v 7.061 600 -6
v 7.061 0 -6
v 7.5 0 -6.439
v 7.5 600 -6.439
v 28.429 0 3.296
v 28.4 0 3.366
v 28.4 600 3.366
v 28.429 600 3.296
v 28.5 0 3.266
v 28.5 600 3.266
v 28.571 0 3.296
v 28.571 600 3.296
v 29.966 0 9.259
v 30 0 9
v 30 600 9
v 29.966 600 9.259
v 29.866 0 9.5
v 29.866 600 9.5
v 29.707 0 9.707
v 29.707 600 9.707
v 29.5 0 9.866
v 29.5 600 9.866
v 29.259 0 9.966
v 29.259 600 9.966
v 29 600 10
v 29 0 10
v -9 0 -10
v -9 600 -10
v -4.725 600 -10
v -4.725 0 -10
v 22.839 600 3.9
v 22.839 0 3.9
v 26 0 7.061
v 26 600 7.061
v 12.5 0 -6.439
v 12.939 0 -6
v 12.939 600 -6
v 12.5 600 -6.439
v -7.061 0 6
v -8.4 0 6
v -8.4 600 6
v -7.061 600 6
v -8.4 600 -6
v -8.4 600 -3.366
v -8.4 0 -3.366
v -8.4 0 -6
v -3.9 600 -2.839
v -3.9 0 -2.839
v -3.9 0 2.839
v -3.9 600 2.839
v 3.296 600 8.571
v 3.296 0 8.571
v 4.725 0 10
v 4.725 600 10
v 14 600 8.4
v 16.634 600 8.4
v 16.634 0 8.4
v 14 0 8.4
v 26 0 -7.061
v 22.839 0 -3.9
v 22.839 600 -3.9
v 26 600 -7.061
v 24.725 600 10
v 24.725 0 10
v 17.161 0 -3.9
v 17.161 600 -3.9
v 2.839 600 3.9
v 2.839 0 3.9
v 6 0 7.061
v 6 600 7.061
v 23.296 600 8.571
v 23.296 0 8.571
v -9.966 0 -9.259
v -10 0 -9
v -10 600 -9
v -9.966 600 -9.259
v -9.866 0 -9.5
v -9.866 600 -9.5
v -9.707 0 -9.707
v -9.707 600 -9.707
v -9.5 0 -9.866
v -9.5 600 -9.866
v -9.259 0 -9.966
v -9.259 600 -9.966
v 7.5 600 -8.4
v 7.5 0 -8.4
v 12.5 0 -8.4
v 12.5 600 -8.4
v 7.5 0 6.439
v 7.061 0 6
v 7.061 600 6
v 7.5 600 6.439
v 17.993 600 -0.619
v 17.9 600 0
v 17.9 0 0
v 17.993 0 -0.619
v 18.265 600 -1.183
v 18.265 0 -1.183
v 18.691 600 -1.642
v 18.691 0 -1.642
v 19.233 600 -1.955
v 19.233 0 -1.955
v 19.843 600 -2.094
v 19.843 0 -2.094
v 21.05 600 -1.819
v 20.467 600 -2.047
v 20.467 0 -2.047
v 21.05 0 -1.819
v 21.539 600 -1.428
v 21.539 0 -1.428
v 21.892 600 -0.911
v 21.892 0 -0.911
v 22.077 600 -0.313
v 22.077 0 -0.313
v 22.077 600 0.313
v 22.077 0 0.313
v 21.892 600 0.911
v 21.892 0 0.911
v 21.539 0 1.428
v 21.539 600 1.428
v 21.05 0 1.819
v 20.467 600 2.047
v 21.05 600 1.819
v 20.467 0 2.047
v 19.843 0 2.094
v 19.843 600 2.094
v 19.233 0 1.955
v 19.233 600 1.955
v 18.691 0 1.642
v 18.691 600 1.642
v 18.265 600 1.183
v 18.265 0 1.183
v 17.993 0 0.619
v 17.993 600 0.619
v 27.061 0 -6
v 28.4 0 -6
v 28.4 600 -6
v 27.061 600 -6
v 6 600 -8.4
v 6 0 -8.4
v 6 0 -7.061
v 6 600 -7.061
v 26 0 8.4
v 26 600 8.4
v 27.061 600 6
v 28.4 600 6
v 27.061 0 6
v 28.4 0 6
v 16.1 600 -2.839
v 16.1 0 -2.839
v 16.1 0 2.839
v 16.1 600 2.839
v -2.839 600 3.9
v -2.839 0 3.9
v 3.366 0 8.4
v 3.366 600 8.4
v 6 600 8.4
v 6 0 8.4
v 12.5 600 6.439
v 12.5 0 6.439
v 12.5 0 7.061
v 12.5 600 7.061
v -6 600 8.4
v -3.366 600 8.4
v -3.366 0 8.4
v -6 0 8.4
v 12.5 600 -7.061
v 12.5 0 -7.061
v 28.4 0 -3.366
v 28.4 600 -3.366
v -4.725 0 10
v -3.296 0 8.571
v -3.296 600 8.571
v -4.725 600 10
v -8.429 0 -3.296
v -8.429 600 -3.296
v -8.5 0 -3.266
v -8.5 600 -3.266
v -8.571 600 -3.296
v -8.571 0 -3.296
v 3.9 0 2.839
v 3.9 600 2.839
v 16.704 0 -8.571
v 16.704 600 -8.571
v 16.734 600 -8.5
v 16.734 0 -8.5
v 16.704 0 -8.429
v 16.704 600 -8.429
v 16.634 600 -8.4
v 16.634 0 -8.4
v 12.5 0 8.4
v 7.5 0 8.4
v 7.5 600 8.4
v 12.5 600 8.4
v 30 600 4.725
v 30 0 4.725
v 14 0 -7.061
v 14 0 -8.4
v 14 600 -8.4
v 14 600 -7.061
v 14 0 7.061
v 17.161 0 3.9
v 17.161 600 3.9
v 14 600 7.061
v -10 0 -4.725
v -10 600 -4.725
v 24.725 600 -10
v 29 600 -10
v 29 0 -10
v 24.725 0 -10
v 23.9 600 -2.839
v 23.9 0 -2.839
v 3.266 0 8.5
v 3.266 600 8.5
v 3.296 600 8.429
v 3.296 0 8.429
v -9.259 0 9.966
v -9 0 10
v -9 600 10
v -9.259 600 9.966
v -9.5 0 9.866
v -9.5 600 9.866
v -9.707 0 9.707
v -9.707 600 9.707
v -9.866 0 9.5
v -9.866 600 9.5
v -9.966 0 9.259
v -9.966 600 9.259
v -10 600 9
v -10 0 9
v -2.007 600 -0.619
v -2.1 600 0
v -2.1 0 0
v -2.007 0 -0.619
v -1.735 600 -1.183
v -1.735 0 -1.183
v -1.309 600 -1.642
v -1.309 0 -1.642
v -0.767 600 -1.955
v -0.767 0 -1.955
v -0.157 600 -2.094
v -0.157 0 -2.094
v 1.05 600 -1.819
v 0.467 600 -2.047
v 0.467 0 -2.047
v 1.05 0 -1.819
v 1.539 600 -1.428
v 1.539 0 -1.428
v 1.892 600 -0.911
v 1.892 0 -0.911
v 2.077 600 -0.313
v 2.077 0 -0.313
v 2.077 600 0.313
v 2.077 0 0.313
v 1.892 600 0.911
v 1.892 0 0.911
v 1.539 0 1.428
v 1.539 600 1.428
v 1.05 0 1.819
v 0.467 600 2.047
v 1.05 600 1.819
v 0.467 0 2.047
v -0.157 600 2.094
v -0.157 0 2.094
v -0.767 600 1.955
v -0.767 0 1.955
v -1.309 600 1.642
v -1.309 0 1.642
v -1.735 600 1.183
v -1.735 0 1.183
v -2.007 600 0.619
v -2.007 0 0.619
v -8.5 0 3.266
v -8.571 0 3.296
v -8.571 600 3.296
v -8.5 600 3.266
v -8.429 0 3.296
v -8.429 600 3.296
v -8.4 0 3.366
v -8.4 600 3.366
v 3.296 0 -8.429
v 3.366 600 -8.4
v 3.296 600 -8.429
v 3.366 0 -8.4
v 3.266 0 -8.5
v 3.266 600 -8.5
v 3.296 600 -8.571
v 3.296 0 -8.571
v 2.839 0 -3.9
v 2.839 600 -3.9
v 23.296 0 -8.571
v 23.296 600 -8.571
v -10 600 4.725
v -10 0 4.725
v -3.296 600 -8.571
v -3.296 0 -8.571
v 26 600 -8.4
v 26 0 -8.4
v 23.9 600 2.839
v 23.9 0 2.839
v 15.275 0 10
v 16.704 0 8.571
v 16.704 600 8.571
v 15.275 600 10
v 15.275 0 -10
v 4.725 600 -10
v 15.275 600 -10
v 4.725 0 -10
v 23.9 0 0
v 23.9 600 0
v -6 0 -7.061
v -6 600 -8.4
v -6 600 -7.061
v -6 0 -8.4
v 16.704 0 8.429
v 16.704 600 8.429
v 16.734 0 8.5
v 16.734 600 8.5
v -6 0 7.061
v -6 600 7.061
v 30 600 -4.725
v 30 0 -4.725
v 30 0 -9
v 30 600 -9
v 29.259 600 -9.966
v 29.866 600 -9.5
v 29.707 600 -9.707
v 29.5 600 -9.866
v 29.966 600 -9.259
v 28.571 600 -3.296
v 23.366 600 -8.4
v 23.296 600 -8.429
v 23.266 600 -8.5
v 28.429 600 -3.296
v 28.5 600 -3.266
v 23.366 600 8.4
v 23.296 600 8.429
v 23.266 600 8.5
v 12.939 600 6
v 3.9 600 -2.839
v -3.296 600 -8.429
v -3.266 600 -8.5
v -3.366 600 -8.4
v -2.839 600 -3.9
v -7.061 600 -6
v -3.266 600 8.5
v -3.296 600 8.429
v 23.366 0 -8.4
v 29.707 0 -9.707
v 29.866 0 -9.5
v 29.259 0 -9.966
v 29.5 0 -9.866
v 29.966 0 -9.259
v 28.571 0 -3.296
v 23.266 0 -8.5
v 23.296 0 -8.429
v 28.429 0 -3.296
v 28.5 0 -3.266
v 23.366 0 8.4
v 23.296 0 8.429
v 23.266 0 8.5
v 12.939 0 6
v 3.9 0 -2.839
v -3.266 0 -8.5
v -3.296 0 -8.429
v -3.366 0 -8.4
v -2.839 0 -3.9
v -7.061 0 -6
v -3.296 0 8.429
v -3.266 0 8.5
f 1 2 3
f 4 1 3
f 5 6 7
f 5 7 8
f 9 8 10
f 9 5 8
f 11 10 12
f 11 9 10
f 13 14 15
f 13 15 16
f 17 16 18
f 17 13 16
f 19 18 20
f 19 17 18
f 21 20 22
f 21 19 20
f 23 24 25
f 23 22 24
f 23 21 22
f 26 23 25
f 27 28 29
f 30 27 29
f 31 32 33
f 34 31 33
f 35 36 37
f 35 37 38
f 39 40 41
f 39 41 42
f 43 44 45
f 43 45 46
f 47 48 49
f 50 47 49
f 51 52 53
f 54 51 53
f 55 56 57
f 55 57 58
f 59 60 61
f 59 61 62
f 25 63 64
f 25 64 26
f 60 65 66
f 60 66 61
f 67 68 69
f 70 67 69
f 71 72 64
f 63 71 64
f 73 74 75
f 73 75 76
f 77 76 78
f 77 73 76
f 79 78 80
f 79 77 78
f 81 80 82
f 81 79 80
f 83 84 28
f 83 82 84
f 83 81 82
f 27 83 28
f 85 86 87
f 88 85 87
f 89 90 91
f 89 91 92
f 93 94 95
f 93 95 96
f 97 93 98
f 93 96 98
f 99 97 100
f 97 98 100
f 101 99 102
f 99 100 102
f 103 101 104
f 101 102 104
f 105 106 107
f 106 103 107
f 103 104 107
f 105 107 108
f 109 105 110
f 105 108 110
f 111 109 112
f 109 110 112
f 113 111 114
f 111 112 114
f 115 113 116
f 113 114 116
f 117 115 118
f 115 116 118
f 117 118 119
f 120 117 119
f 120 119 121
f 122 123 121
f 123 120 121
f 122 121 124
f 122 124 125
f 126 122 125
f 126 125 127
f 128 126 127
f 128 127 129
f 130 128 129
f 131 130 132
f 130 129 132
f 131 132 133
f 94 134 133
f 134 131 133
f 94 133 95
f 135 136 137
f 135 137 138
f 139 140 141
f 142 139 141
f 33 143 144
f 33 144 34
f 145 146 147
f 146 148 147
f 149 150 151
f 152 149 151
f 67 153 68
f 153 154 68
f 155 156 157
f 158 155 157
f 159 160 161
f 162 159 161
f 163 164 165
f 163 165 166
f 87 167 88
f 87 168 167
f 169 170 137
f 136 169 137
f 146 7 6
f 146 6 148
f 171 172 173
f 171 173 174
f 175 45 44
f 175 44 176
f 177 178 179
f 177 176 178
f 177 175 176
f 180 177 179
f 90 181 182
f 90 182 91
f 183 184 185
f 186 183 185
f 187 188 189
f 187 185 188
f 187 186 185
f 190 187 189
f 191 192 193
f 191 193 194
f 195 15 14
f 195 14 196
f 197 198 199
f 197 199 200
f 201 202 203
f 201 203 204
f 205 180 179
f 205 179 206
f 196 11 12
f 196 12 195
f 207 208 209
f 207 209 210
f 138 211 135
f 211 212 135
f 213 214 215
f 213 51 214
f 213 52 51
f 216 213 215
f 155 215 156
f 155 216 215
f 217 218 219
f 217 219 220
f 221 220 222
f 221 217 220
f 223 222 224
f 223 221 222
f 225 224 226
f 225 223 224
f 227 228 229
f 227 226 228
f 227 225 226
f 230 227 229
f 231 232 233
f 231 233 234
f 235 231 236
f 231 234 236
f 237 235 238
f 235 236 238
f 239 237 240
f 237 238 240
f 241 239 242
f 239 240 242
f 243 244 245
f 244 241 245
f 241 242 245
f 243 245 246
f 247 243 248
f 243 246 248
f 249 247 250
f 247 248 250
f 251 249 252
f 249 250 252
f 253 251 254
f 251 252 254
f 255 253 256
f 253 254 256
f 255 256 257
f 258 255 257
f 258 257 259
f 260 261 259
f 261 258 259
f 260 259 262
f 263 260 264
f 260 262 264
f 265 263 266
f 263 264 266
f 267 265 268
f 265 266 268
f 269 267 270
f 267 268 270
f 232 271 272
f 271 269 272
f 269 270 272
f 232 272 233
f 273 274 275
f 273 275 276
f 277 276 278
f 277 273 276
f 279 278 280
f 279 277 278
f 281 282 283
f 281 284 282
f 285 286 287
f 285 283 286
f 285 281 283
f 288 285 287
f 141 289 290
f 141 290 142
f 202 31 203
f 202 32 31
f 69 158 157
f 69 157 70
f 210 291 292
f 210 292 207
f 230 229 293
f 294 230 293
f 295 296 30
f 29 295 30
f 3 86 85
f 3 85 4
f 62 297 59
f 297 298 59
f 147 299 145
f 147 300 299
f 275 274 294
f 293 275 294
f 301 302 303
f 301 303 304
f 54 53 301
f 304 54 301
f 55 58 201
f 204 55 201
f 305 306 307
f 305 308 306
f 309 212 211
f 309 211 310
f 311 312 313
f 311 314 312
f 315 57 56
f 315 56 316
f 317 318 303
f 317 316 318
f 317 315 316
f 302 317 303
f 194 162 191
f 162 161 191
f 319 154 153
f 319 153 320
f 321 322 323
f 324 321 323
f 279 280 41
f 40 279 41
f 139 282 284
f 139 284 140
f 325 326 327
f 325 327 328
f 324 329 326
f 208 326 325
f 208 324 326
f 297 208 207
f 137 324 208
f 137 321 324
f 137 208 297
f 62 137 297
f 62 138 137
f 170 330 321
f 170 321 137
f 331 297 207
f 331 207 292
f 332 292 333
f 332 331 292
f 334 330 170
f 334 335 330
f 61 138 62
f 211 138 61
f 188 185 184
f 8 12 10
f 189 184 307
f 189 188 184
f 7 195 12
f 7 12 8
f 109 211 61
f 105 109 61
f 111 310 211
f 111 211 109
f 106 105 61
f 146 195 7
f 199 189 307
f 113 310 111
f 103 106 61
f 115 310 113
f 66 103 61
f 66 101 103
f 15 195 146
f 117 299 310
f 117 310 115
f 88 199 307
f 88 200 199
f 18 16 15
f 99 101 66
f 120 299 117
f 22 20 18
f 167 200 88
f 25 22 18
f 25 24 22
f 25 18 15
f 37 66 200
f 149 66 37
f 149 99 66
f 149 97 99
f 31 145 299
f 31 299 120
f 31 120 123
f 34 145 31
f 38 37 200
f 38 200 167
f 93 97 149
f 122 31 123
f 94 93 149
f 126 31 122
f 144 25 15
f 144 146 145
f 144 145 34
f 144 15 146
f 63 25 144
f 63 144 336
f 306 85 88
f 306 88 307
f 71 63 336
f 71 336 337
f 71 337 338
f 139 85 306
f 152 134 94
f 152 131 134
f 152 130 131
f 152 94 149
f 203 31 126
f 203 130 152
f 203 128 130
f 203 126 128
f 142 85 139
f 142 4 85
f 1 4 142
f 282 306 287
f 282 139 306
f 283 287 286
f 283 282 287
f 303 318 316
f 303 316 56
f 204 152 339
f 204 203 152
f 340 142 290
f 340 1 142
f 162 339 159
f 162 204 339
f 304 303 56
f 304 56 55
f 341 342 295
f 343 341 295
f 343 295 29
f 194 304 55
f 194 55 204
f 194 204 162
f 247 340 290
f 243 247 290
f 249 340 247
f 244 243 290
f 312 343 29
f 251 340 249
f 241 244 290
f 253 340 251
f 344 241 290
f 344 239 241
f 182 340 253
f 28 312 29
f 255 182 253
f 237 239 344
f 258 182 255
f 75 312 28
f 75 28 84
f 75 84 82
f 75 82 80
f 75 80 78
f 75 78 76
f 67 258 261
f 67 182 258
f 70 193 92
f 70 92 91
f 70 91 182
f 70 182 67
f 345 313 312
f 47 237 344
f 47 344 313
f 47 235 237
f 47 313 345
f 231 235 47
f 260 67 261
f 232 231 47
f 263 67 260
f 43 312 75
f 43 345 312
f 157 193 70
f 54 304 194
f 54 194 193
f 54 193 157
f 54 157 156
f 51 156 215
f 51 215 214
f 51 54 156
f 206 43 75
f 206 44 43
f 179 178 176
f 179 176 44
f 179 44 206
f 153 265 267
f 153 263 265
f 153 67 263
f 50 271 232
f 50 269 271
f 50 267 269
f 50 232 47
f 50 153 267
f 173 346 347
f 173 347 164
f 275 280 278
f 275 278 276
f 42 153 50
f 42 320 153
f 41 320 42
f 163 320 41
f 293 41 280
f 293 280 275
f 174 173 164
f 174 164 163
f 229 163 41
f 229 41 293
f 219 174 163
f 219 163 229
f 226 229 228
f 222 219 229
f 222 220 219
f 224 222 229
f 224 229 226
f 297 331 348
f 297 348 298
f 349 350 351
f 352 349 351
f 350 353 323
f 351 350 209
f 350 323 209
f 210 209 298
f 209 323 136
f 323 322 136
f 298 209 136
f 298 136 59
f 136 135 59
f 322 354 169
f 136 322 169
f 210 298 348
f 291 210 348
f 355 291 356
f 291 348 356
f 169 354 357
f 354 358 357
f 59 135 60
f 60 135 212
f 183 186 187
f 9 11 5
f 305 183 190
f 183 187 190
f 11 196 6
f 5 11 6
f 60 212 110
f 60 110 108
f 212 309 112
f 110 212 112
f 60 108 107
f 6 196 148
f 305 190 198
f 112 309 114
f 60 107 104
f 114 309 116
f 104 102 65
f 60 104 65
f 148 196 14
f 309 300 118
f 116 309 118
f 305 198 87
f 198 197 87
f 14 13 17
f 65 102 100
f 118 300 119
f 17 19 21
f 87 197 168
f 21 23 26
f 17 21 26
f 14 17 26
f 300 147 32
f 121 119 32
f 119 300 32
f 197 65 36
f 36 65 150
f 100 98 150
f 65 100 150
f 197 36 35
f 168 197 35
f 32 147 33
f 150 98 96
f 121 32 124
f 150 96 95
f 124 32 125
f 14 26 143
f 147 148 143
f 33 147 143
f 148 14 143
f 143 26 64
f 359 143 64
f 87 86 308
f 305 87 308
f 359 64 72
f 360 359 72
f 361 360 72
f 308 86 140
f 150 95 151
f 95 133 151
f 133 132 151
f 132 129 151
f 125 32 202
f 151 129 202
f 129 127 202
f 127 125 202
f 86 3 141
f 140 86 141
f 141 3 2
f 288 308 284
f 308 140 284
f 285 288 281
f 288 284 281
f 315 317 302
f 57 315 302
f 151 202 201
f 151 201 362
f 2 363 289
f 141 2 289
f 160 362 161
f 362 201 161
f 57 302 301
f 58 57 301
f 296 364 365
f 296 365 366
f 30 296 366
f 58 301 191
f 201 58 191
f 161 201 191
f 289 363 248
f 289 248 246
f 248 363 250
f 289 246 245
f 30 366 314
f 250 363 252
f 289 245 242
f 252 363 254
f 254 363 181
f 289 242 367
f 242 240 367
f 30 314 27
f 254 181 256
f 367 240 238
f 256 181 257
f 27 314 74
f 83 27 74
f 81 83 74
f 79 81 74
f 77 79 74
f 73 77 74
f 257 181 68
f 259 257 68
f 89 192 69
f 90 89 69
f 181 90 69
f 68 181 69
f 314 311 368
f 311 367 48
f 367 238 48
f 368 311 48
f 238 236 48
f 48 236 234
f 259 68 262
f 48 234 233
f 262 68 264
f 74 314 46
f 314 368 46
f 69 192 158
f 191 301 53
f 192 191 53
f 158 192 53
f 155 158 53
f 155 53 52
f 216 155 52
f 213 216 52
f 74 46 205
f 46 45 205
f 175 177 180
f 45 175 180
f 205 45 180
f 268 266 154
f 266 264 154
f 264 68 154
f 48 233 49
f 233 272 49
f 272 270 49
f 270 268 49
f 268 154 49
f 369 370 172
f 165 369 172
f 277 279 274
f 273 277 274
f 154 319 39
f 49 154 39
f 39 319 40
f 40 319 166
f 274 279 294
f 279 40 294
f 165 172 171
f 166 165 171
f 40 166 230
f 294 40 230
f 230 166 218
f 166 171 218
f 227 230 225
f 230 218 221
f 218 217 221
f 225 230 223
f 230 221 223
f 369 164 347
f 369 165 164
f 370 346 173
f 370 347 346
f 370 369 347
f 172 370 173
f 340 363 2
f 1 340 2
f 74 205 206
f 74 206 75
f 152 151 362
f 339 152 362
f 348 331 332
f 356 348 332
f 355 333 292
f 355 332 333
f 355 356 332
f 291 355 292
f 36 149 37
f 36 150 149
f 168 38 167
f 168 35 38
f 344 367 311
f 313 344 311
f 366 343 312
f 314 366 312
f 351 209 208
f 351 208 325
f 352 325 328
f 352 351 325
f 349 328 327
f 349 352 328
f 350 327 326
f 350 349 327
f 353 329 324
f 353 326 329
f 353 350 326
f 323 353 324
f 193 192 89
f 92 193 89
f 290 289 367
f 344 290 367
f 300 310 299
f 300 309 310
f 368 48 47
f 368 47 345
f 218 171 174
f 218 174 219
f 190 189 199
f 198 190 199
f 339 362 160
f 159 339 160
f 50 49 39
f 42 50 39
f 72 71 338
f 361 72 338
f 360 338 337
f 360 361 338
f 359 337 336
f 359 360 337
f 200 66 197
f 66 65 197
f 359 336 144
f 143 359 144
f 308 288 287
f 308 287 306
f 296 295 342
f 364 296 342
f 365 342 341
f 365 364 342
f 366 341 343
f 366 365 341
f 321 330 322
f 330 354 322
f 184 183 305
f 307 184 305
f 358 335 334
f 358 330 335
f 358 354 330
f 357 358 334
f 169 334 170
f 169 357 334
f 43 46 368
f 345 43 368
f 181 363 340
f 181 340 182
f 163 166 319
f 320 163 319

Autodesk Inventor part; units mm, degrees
ref_plane "YZ Plane" through (0, 0, 0) normal (1, 0, 0) x (0, 1, 0)
ref_plane "XZ Plane" through (0, 0, 0) normal (0, 1, 0) x (-1, 0, 0)
ref_plane "XY Plane" through (0, 0, 0) normal (0, 0, 1) x (1, 0, 0)
sketch "Sketch1" plane through (0, 0, 0) normal (0, 1, 0) x (-1, 0, 0)
  line L0 (3.9, -2.8393) -> (3.9, 2.8393)
  line L1 (2.8393, 3.9) -> (-2.8393, 3.9)
  line L2 (-2.8393, -3.9) -> (2.8393, -3.9)
  line L3 (8.5707, 3.2957) -> (10, 4.725)
  line L4 (8.5707, -3.2957) -> (10, -4.725)
  line L5 (8.4, 3.3664) -> (8.4, 6)
  line L6 (8.4, 6) -> (7.0607, 6)
  line L7 (10, 9) -> (10, 4.725)
  line L8 (10, -4.725) -> (10, -9)
  line L9 (3.9, 2.8393) -> (7.0607, 6)
  line L10 (3.2957, 8.5707) -> (4.725, 10)
  line L11 (3.3664, 8.4) -> (6, 8.4)
  line L12 (6, 8.4) -> (6, 7.0607)
  line L13 (2.8393, 3.9) -> (6, 7.0607)
  line L14 (8.4, -3.3664) -> (8.4, -6)
  line L15 (8.4, -6) -> (7.0607, -6)
  line L16 (3.9, -2.8393) -> (7.0607, -6)
  line L17 (3.2957, -8.5707) -> (4.725, -10)
  line L18 (3.3664, -8.4) -> (6, -8.4)
  line L19 (6, -8.4) -> (6, -7.0607)
  line L20 (2.8393, -3.9) -> (6, -7.0607)
  line L21 (-3.9, -2.8393) -> (-3.9, 2.8393)
  line L22 (-3.9, 2.8393) -> (-7.0607, 6)
  line L23 (-6, 8.4) -> (-6, 7.0607)
  line L24 (-2.8393, 3.9) -> (-6, 7.0607)
  line L25 (-3.9, -2.8393) -> (-7.0607, -6)
  line L26 (-2.8393, -3.9) -> (-6, -7.0607)
  line L27 (-6, -8.4) -> (-6, -7.0607)
  line L28 (-3.3664, -8.4) -> (-6, -8.4)
  line L29 (-3.2957, -8.5707) -> (-4.725, -10)
  line L30 (4.725, 10) -> (9, 10)
  line L31 (9, -10) -> (4.725, -10)
  circle A0 centre (0, 0) radius 2.1
  arc A1 (10, 9) -> (9, 10) centre (9, 9) ccw
  arc A2 (9, -10) -> (10, -9) centre (9, -9) ccw
  arc A3 (8.4, 3.3664) -> (8.5707, 3.2957) centre (8.5, 3.3664) ccw
  arc A4 (3.2957, 8.5707) -> (3.3664, 8.4) centre (3.3664, 8.5) ccw
  arc A5 (8.5707, -3.2957) -> (8.4, -3.3664) centre (8.5, -3.3664) ccw
  arc A6 (3.3664, -8.4) -> (3.2957, -8.5707) centre (3.3664, -8.5) ccw
  arc A7 (-3.2957, -8.5707) -> (-3.3664, -8.4) centre (-3.3664, -8.5) ccw
  line L32 (-23.9, -2.8393) -> (-23.9, 2.8393)
  line L33 (-22.8393, 3.9) -> (-17.1607, 3.9)
  line L34 (-17.1607, -3.9) -> (-22.8393, -3.9)
  line L35 (-28.5707, 3.2957) -> (-30, 4.725)
  line L36 (-28.5707, -3.2957) -> (-30, -4.725)
  line L37 (-28.4, 3.3664) -> (-28.4, 6)
  line L38 (-28.4, 6) -> (-27.0607, 6)
  line L39 (-30, 9) -> (-30, 4.725)
  line L40 (-30, -4.725) -> (-30, -9)
  line L41 (-23.9, 2.8393) -> (-27.0607, 6)
  line L42 (-23.2957, 8.5707) -> (-24.725, 10)
  line L43 (-23.3664, 8.4) -> (-26, 8.4)
  line L44 (-26, 8.4) -> (-26, 7.0607)
  line L45 (-22.8393, 3.9) -> (-26, 7.0607)
  line L46 (-23.9, 0) -> (-28.4, 0)
  line L47 (-23.9, -2.8393) -> (-27.0607, -6)
  line L48 (-28.4, -6) -> (-27.0607, -6)
  line L49 (-28.4, -3.3664) -> (-28.4, -6)
  line L50 (-22.8393, -3.9) -> (-26, -7.0607)
  line L51 (-26, -8.4) -> (-26, -7.0607)
  line L52 (-23.3664, -8.4) -> (-26, -8.4)
  line L53 (-23.2957, -8.5707) -> (-24.725, -10)
  line L54 (-16.1, -2.8393) -> (-12.9393, -6)
  line L55 (-17.1607, -3.9) -> (-14, -7.0607)
  line L56 (-16.6336, -8.4) -> (-14, -8.4)
  line L57 (-16.1, -2.8393) -> (-16.1, 2.8393)
  line L58 (-16.1, 2.8393) -> (-12.9393, 6)
  line L59 (-17.1607, 3.9) -> (-14, 7.0607)
  line L60 (-14, 8.4) -> (-14, 7.0607)
  line L61 (-14, -8.4) -> (-14, -7.0607)
  line L62 (-16.7043, -8.5707) -> (-15.275, -10)
  line L63 (-24.725, 10) -> (-29, 10)
  line L64 (-29, -10) -> (-24.725, -10)
  circle A8 centre (-20, 0) radius 2.1
  arc A9 (-29, 10) -> (-30, 9) centre (-29, 9) ccw
  arc A10 (-30, -9) -> (-29, -10) centre (-29, -9) ccw
  arc A11 (-28.5707, 3.2957) -> (-28.4, 3.3664) centre (-28.5, 3.3664) ccw
  arc A12 (-23.3664, 8.4) -> (-23.2957, 8.5707) centre (-23.3664, 8.5) ccw
  arc A13 (-28.4, -3.3664) -> (-28.5707, -3.2957) centre (-28.5, -3.3664) ccw
  arc A14 (-23.2957, -8.5707) -> (-23.3664, -8.4) centre (-23.3664, -8.5) ccw
  arc A15 (-16.6336, -8.4) -> (-16.7043, -8.5707) centre (-16.6336, -8.5) ccw
  arc A16 (-16.7043, 8.5707) -> (-16.6336, 8.4) centre (-16.6336, 8.5) ccw
  line L65 (-7.5, -8.4) -> (-7.5, -6.4393)
  line L66 (-7.0607, -6) -> (-7.5, -6.4393)
  line L67 (-12.5, -7.0607) -> (-12.5, -8.4)
  line L68 (-12.9393, -6) -> (-12.5, -6.4393)
  line L69 (-12.5, -6.4393) -> (-12.5, -7.0607)
  line L70 (-7.5, -8.4) -> (-12.5, -8.4)
  line L71 (-4.725, -10) -> (-15.275, -10)
  line L72 (-3.9, 2.8393) -> (-7.0607, 6)
  line L73 (-2.8393, 3.9) -> (-6, 7.0607)
  line L74 (-3.3664, 8.4) -> (-6, 8.4)
  line L75 (-6, 8.4) -> (-6, 7.0607)
  line L76 (-3.2957, 8.5707) -> (-4.725, 10)
  arc A17 (-3.3664, 8.4) -> (-3.2957, 8.5707) centre (-3.3664, 8.5) ccw
  line L77 (-16.1, 2.8393) -> (-12.9393, 6)
  line L78 (-17.1607, 3.9) -> (-14, 7.0607)
  line L79 (-16.6336, 8.4) -> (-14, 8.4)
  line L80 (-14, 8.4) -> (-14, 7.0607)
  line L81 (-16.7043, 8.5707) -> (-15.275, 10)
  arc A18 (-16.7043, 8.5707) -> (-16.6336, 8.4) centre (-16.6336, 8.5) ccw
  line L82 (-7.5, 8.4) -> (-7.5, 6.4393)
  line L83 (-7.0607, 6) -> (-7.5, 6.4393)
  line L84 (-12.5, 7.0607) -> (-12.5, 8.4)
  line L85 (-12.9393, 6) -> (-12.5, 6.4393)
  line L86 (-12.5, 6.4393) -> (-12.5, 7.0607)
  line L87 (-7.5, 8.4) -> (-12.5, 8.4)
  line L88 (-4.725, 10) -> (-15.275, 10)
extrude "Extrusion1" add sketch "Sketch1" along normal blind 600
properties part number "VSLOT20x40x600"
